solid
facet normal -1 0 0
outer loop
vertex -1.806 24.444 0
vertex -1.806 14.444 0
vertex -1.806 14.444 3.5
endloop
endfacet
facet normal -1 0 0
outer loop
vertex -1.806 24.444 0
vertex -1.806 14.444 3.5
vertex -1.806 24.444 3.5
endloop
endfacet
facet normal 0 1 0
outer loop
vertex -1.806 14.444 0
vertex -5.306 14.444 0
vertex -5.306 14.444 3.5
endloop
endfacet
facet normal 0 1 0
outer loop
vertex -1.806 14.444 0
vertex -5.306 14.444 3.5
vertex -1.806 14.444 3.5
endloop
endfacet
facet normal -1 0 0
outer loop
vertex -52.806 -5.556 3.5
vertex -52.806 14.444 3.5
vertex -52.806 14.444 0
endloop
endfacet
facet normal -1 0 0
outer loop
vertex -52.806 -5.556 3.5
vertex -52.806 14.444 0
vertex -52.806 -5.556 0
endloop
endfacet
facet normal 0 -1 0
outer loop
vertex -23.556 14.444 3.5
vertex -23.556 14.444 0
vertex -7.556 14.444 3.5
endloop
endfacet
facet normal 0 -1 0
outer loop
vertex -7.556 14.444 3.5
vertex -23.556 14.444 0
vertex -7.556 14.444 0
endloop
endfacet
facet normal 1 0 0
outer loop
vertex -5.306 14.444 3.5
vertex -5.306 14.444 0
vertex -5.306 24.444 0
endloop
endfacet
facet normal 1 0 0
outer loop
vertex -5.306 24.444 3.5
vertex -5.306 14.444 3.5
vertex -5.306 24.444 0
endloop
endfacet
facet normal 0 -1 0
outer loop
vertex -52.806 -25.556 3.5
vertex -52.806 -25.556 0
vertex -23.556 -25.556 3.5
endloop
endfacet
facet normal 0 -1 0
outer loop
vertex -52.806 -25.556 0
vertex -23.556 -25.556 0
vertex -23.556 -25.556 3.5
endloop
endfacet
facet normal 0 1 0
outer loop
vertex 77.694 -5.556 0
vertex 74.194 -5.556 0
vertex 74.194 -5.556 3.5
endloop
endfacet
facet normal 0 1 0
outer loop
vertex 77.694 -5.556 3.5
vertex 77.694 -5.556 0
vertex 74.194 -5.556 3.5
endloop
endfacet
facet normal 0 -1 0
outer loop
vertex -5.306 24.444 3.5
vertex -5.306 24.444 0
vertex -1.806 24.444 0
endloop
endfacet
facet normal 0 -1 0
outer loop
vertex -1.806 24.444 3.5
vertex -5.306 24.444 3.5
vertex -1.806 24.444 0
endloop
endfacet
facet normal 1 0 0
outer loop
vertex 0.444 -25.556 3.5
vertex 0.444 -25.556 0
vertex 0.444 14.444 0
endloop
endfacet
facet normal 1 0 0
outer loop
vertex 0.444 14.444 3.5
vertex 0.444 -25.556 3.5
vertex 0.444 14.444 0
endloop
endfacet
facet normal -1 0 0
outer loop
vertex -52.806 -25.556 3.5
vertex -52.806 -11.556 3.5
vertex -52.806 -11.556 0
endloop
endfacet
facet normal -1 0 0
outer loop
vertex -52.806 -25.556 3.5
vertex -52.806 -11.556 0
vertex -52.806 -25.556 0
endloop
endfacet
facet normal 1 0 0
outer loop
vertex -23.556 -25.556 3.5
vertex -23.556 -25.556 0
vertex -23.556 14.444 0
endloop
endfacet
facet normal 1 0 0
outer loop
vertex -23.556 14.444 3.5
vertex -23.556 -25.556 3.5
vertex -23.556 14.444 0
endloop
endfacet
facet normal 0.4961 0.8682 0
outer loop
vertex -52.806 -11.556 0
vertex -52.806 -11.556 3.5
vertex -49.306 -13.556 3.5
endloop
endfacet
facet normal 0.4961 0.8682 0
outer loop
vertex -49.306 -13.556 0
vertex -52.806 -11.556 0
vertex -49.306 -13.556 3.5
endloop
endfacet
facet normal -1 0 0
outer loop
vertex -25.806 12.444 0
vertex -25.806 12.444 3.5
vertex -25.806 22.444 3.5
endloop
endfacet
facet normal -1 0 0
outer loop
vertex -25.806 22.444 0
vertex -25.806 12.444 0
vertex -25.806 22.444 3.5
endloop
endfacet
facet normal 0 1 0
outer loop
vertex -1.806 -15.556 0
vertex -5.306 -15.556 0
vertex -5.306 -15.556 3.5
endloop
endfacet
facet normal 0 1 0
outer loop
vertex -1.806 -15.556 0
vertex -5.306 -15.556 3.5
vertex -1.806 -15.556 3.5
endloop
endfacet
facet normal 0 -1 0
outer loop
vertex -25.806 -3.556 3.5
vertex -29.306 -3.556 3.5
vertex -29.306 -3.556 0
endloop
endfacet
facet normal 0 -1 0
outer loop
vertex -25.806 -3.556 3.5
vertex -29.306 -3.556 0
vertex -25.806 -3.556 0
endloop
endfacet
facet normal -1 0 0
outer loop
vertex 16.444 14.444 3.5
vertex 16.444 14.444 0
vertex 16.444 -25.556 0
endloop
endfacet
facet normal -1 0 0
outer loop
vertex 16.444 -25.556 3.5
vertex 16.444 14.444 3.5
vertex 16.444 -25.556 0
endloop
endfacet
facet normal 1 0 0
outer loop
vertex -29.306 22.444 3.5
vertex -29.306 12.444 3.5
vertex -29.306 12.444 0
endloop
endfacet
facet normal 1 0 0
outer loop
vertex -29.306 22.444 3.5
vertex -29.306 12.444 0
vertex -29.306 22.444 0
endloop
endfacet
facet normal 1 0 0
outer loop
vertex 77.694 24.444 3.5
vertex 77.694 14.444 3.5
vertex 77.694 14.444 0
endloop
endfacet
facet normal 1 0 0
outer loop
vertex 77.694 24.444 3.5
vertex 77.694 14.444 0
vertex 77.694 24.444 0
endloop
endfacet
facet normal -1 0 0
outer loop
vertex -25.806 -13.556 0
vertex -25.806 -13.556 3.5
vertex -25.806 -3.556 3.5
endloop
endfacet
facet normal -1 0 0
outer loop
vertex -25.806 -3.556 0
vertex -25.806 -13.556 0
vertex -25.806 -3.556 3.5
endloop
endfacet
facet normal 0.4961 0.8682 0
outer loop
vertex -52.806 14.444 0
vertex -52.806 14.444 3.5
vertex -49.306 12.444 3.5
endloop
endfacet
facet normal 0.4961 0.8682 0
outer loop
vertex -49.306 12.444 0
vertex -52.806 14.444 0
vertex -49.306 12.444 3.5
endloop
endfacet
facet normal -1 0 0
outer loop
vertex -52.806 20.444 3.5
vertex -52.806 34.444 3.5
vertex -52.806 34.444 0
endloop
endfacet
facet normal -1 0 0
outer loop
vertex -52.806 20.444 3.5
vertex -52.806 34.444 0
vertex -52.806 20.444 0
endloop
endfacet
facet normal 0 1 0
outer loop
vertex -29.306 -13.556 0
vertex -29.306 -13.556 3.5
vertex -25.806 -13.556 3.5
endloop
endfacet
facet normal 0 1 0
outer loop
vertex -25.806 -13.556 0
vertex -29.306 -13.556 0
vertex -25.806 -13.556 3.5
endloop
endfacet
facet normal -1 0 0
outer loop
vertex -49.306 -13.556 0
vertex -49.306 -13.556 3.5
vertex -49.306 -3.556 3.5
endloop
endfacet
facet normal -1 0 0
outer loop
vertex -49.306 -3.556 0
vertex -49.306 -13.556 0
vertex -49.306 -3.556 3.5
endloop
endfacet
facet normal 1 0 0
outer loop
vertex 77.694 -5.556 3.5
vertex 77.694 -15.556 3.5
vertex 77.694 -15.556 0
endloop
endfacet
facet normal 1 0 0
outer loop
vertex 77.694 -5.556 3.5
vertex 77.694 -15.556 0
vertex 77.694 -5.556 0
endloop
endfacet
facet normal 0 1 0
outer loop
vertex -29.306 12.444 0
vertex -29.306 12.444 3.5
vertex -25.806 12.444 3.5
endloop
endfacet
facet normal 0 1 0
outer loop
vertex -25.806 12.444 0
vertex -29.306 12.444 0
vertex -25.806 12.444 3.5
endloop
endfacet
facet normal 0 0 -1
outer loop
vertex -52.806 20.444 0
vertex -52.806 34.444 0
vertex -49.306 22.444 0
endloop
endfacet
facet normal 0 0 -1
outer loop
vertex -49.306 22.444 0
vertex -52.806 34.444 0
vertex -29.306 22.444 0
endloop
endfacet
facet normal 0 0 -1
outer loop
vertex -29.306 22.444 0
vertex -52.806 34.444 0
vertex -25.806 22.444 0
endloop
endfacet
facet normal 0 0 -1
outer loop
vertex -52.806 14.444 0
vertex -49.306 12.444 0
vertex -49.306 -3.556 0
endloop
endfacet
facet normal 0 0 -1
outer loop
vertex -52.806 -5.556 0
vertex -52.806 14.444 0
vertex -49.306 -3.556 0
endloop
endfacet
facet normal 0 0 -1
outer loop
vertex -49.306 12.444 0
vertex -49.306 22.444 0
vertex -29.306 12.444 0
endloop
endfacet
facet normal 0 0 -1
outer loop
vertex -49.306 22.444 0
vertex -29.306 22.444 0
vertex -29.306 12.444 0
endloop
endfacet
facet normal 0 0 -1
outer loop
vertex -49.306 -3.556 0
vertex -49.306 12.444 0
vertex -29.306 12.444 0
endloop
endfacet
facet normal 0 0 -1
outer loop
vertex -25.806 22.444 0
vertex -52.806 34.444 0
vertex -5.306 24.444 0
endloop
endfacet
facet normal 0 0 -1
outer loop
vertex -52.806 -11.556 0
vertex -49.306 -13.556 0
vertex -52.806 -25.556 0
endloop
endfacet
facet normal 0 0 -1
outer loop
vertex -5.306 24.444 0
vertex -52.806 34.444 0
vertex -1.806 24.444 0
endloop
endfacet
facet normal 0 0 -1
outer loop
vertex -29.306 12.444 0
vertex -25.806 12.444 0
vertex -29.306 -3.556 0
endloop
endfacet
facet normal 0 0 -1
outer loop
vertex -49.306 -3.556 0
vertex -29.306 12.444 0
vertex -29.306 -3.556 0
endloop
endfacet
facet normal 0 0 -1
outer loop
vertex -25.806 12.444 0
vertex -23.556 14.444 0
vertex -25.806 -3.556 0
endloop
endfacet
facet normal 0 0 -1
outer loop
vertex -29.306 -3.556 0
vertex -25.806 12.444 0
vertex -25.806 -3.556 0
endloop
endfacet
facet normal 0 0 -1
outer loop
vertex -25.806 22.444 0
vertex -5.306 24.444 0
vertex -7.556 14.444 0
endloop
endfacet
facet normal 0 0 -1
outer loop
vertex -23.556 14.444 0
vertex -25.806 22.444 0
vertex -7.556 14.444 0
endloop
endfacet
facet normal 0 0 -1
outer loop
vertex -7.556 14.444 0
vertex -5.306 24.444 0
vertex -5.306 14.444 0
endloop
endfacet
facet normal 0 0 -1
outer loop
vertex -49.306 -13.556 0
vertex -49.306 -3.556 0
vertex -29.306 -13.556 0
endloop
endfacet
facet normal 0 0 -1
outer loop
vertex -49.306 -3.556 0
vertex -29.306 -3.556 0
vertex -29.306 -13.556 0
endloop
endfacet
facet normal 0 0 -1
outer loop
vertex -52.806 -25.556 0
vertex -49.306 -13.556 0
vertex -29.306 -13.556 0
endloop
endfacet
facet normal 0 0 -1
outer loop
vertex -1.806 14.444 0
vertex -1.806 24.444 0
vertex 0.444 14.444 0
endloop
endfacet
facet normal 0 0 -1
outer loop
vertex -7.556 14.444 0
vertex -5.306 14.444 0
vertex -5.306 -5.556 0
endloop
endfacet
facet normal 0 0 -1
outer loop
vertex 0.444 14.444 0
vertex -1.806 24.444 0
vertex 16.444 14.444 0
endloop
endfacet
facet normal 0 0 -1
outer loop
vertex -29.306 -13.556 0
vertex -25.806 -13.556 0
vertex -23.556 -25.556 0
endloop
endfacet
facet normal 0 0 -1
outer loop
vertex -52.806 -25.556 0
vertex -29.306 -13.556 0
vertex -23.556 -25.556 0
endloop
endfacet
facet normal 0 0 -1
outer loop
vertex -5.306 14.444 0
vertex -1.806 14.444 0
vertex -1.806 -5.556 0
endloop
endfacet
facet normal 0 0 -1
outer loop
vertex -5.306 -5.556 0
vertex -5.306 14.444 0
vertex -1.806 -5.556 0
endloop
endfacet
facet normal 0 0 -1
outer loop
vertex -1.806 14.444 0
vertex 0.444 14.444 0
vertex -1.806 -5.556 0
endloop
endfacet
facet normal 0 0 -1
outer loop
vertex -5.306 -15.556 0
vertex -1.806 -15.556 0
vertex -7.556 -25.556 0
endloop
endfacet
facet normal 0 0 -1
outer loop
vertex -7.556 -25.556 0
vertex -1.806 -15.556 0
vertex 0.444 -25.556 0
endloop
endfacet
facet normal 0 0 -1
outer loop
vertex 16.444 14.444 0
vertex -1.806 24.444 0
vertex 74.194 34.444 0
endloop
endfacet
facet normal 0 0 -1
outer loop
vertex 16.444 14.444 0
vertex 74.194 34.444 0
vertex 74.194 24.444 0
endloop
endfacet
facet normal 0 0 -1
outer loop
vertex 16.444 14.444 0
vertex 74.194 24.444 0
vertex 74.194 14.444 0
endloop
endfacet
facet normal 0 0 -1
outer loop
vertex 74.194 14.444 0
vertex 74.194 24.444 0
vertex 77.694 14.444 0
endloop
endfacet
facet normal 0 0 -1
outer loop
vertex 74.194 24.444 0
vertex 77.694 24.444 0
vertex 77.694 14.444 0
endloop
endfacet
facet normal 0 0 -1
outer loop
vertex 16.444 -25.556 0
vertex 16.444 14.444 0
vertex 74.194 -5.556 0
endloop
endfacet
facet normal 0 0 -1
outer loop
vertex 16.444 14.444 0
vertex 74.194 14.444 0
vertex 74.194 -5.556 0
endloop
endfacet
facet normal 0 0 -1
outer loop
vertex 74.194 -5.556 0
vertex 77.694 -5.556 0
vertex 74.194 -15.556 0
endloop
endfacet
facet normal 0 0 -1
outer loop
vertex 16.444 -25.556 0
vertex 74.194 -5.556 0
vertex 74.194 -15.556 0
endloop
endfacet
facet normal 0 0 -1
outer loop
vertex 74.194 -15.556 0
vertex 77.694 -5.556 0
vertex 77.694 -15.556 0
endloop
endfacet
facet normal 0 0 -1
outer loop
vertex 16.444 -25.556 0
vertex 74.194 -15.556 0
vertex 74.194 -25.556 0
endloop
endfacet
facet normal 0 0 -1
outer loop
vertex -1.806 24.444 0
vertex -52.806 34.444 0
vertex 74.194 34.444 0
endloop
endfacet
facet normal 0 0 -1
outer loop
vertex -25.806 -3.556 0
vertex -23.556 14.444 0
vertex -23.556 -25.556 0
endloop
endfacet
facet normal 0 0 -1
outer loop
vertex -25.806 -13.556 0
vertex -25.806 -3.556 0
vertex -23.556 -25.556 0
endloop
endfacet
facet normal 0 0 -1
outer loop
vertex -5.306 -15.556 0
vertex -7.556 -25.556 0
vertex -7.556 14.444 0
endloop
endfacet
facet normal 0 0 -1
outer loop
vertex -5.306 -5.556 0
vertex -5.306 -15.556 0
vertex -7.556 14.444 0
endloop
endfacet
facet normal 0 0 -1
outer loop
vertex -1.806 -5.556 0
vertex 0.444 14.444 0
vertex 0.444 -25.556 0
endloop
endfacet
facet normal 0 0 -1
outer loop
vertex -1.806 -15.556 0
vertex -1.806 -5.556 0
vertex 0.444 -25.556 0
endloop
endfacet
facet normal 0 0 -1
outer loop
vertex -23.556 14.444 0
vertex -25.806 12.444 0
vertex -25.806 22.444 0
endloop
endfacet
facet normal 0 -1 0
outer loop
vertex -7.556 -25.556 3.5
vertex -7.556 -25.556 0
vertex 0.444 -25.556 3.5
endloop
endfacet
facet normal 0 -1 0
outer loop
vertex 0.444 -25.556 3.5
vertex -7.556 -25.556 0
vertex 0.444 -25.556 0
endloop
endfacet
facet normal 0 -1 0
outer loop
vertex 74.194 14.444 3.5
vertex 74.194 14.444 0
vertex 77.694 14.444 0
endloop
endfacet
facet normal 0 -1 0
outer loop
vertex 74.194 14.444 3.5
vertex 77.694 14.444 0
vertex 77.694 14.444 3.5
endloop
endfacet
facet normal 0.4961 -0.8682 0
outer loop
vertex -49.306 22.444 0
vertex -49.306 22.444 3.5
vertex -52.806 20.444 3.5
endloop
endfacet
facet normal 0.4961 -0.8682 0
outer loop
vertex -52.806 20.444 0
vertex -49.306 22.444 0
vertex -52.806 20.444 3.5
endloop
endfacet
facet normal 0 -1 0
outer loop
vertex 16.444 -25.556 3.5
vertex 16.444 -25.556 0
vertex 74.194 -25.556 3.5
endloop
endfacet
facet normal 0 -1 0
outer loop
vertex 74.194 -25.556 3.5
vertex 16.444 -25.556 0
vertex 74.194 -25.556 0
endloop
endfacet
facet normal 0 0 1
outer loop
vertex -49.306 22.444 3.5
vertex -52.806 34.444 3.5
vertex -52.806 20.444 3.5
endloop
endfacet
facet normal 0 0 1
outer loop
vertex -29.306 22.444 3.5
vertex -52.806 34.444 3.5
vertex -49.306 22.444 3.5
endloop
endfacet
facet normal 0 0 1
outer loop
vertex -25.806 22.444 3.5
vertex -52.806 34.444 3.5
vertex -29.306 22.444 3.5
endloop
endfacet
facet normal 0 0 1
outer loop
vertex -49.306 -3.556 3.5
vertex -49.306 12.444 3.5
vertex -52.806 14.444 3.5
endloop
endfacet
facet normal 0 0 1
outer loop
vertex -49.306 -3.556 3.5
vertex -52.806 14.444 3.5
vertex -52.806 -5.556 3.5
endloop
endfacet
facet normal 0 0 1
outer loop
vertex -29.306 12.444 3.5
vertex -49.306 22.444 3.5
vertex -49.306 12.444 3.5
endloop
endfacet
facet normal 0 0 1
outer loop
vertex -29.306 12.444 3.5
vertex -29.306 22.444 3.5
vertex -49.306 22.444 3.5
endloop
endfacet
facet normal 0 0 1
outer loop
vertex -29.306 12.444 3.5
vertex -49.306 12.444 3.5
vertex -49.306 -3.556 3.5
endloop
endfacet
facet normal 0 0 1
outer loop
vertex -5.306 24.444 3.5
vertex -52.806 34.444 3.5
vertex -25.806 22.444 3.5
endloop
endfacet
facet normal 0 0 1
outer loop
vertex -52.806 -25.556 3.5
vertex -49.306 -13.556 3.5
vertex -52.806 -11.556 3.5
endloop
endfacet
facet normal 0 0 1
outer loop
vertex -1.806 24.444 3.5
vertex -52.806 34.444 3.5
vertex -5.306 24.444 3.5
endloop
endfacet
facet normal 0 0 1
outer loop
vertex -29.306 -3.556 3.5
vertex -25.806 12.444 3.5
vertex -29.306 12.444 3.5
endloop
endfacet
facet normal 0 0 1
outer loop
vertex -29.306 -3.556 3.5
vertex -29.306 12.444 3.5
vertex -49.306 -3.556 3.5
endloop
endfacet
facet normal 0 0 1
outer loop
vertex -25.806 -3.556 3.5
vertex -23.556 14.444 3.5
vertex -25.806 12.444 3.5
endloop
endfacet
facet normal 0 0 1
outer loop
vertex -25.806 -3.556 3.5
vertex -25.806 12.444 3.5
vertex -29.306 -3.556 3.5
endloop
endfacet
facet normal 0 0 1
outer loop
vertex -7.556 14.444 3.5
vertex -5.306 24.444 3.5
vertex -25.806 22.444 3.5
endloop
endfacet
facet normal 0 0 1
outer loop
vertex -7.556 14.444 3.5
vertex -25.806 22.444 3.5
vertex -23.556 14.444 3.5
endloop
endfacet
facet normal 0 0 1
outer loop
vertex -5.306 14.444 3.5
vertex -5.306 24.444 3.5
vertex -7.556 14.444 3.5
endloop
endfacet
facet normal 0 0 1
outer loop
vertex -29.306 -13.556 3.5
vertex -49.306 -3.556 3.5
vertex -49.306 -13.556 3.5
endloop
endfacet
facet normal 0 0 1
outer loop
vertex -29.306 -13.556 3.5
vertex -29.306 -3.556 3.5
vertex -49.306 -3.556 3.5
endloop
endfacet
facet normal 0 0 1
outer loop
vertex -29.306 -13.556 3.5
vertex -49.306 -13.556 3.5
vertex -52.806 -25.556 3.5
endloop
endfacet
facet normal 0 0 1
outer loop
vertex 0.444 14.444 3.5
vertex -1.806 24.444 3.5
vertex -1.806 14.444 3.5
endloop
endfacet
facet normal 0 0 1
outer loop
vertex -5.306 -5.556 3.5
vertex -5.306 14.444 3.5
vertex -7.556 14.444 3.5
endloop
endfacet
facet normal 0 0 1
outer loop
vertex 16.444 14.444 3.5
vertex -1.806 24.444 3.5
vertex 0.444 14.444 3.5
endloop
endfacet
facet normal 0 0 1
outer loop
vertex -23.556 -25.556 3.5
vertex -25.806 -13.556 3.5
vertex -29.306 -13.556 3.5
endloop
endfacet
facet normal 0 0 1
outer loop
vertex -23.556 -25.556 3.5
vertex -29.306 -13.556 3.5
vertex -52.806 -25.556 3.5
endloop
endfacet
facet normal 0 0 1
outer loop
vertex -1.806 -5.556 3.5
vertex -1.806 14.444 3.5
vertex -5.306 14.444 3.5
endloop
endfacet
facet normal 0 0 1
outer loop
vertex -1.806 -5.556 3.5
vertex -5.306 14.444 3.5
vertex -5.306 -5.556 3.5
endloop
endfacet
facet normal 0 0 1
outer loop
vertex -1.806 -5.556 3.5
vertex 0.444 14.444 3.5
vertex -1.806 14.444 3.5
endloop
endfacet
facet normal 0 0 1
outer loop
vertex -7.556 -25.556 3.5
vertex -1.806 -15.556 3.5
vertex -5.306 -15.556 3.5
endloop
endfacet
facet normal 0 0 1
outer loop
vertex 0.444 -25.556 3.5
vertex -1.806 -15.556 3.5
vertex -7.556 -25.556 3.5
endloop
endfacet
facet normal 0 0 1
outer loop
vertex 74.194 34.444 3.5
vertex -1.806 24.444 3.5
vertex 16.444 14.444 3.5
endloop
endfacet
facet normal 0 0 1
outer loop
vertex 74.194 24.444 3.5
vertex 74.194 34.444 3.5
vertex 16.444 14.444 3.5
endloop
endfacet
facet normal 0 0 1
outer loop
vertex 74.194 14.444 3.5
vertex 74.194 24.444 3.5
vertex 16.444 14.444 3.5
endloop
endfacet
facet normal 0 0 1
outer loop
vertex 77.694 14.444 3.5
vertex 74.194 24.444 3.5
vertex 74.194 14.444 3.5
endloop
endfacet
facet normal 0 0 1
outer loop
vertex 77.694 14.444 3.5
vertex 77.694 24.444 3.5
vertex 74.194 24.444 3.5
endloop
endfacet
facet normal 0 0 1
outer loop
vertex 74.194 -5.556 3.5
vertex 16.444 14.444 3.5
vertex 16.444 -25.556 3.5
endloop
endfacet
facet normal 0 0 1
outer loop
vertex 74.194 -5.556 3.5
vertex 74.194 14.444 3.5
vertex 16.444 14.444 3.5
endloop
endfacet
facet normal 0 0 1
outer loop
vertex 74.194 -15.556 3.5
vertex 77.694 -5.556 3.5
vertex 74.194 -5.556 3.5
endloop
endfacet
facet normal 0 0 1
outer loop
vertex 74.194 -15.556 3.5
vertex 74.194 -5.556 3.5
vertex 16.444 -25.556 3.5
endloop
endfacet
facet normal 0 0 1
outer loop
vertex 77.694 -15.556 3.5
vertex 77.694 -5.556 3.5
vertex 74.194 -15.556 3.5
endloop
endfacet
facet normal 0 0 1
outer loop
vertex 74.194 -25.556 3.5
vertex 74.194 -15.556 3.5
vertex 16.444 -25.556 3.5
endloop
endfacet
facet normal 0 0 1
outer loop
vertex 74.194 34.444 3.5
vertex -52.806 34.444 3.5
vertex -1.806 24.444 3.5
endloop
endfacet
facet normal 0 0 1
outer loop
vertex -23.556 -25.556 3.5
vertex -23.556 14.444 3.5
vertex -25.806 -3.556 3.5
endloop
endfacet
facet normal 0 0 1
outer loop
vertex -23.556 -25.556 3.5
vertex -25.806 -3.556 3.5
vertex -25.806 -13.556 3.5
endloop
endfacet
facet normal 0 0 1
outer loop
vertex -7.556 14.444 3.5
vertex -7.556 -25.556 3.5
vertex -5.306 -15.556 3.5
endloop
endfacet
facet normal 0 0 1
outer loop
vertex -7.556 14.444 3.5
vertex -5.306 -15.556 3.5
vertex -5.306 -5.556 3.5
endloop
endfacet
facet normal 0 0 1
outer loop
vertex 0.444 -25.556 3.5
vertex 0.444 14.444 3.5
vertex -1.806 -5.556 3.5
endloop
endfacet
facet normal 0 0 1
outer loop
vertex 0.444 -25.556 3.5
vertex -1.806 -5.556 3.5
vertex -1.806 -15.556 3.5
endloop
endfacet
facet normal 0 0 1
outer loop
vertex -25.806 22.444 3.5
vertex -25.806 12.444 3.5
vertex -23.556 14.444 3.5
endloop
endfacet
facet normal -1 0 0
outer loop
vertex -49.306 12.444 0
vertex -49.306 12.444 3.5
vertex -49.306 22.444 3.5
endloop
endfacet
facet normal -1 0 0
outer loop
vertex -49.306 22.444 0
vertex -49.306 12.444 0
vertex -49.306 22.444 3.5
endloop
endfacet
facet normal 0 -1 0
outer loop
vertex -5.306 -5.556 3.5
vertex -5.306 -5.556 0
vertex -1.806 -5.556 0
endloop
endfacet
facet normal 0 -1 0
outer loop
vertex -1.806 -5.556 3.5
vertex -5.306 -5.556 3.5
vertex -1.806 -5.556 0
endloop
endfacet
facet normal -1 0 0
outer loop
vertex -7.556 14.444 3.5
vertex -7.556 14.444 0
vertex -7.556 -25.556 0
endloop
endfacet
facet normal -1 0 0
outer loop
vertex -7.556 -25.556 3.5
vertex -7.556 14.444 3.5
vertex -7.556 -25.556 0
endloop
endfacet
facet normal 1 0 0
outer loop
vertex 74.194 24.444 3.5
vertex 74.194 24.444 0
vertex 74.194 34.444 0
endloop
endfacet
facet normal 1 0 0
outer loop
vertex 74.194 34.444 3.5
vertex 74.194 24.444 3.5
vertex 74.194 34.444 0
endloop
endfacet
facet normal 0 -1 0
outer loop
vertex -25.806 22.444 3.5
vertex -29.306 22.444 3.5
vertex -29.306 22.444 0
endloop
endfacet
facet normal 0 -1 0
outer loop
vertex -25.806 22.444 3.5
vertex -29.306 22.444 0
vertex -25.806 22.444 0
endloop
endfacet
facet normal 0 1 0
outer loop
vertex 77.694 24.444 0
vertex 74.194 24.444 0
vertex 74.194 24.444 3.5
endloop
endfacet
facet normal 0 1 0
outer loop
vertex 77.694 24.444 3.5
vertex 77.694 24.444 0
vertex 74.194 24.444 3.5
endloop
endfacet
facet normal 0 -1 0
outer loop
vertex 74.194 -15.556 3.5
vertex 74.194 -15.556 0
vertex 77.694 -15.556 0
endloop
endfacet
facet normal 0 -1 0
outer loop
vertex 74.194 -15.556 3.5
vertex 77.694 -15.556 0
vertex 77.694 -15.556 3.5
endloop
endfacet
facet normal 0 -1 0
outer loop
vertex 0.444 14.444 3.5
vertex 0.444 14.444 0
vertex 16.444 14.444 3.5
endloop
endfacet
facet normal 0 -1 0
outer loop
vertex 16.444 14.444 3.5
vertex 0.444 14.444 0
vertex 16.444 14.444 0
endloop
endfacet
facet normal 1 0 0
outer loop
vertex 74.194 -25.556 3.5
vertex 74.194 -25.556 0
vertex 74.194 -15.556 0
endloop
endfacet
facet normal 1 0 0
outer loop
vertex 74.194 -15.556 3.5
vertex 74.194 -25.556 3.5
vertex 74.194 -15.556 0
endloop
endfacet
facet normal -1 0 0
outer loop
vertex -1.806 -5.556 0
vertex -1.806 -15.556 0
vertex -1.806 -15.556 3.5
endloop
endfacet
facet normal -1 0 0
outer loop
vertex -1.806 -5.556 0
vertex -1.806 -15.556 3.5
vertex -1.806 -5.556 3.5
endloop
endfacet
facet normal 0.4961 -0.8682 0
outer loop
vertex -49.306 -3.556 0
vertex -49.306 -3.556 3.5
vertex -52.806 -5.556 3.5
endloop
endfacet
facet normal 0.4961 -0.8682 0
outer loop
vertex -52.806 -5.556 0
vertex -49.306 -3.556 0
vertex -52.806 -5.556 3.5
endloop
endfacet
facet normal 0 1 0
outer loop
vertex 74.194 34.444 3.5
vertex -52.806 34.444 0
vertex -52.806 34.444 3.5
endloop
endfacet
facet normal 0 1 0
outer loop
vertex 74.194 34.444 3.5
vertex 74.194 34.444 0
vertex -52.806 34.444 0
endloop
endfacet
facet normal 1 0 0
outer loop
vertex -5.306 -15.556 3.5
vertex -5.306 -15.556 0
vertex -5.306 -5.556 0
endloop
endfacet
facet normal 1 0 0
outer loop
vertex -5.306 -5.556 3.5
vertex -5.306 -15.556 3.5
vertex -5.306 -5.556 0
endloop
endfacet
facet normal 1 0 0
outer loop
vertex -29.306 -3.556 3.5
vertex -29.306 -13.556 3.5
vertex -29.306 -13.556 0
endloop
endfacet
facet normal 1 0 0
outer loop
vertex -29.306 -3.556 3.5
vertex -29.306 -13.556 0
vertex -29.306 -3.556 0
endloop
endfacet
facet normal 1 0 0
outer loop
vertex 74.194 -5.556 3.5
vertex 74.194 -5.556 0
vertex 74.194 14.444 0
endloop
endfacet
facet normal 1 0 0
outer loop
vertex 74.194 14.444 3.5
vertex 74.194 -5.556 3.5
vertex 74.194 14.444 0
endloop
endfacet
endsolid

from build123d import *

# Parameters (mm, degrees)
F0_W      = 3.5
F0_H      = 10
F1_DEPTH  = 3.5
F1_FACE_W = 60
F1_FACE_H = 3.5
F2_DEPTH  = 3.5
F4_DEPTH  = 3.5
F5_W      = 10
F5_H      = 3.5
F6_DEPTH  = 3.5
F7_W      = 3.5
F7_H      = 10
F8_DEPTH  = 3.5


with BuildPart() as f1:
    # F0 (on Top) → F1 (new body)
    with BuildSketch(Plane.XY):
        Polygon((-49.305556, 34.444444), (-49.305556, -25.555556), (-23.555556, -25.555556), (-23.555556, 14.444444), (-7.555556, 14.444444), (-7.555556, -25.555556), (-5.305556, -25.555556), (-1.805556, -25.555556), (0.444444, -25.555556), (0.444444, 14.444444), (16.444444, 14.444444), (16.444444, -25.555556), (74.194444, -25.555556), (74.194444, 34.444444), (-1.805556, 34.444444), (-5.305556, 34.444444), align=None)
        with Locations((-3.555556, -10.555556)):
            Rectangle(F0_W, F0_H, mode=Mode.SUBTRACT)
        with Locations((-3.555556, 19.444444)):
            Rectangle(F0_W, F0_H, mode=Mode.SUBTRACT)
    extrude(amount=F1_DEPTH)

    # F1_face (on face) → F2 (join)
    with BuildSketch(Plane(origin=(-49.305556, 4.444444, 1.75), x_dir=(0, -1, 0), z_dir=(-1, 0, 0))):
        Rectangle(F1_FACE_W, F1_FACE_H)
    extrude(amount=F2_DEPTH)

    # F3 (on face) → F4 (cut)
    with BuildSketch(Plane.XY.offset(3.5)):
        Polygon((-49.305556, 22.444444), (-52.805556, 20.444444), (-52.805556, 14.444444), (-49.305556, 12.444444), align=None)
        Polygon((-49.305556, -3.555556), (-52.805556, -5.555556), (-52.805556, -11.555556), (-49.305556, -13.555556), align=None)
    extrude(amount=-F4_DEPTH, mode=Mode.SUBTRACT)

    # F5 (on face) → F6 (join)
    with BuildSketch(Plane.YZ.offset(74.194444)):
        with Locations((-10.555556, 1.75)):
            Rectangle(F5_W, F5_H)
        with Locations((19.444444, 1.75)):
            Rectangle(F5_W, F5_H)
    extrude(amount=F6_DEPTH)

    # F7 (on face) → F8 (cut)
    with BuildSketch(Plane.XY.offset(3.5)):
        with Locations((-27.555556, 17.444444)):
            Rectangle(F7_W, F7_H)
        with Locations((-27.555556, -8.555556)):
            Rectangle(F7_W, F7_H)
    extrude(amount=-F8_DEPTH, mode=Mode.SUBTRACT)


solid = f1.part
